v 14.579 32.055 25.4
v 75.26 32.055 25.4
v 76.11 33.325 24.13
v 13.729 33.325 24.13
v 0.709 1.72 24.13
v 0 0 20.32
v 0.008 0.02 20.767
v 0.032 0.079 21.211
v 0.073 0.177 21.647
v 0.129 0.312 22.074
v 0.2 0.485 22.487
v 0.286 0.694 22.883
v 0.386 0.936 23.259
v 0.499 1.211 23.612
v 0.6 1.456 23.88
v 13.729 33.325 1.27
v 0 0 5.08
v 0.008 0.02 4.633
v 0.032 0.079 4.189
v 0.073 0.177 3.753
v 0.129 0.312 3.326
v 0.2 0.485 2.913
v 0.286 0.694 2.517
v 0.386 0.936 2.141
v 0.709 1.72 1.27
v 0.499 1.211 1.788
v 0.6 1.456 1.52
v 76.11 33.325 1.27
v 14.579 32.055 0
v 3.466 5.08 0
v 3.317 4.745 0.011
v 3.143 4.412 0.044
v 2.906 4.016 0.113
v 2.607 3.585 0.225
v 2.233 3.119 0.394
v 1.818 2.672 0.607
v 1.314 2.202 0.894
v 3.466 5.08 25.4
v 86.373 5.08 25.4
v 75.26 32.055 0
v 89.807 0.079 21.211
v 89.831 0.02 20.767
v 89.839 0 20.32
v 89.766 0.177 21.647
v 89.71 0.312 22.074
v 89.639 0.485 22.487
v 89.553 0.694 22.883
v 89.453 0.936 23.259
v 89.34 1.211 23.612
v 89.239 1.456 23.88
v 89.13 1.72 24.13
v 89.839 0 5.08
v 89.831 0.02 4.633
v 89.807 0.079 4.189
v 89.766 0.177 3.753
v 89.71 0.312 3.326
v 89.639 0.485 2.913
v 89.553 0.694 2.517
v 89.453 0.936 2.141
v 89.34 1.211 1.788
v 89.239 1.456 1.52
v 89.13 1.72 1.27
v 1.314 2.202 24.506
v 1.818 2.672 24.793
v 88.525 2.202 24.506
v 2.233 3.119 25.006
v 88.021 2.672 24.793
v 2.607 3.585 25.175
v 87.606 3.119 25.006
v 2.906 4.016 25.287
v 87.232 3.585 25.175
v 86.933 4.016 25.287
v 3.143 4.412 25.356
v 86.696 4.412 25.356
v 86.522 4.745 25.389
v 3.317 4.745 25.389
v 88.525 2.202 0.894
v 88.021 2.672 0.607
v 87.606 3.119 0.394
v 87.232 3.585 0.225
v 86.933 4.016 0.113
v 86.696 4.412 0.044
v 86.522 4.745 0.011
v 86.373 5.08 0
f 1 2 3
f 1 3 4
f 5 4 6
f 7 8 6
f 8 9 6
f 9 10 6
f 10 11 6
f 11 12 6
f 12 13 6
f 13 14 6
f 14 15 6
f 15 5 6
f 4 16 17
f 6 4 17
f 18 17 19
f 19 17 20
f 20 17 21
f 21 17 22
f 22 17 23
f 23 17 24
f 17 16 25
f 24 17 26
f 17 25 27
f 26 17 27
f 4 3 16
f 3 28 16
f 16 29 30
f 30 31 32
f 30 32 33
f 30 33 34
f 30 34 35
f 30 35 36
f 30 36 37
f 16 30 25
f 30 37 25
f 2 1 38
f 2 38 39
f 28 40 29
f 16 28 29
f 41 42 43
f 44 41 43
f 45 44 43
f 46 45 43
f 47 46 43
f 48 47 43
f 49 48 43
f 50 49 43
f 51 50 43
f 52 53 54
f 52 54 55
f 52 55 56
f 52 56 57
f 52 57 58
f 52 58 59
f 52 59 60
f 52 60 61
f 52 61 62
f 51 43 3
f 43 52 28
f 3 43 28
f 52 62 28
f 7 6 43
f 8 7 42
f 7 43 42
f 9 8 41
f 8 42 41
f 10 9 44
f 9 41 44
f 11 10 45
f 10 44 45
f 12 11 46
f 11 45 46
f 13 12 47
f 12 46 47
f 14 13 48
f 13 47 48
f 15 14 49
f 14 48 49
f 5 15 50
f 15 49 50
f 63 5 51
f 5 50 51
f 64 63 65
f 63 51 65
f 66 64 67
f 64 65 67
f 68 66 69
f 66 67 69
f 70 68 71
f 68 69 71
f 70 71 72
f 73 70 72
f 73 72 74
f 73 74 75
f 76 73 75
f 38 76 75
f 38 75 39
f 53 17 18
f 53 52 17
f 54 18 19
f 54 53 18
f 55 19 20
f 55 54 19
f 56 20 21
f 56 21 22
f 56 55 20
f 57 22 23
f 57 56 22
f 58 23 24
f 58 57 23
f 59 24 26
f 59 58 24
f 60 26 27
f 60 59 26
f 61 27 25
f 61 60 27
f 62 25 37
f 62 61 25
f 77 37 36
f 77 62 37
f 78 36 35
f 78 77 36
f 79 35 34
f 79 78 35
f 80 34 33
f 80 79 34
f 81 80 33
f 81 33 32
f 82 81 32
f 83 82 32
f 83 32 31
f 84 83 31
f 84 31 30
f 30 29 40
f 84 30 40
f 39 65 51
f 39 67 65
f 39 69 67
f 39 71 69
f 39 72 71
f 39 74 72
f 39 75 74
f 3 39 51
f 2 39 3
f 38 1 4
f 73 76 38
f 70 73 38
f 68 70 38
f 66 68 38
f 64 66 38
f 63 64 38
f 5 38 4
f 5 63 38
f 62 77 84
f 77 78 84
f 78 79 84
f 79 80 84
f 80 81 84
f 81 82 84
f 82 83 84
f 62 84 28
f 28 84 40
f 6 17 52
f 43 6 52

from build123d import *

# Parameters (mm, degrees)
F1_DEPTH = 25.4
F2_SIZE  = 1.27
F3_R     = 5.08
F4_SIZE  = 1.27


with BuildPart() as f1:
    # F0 (on Top) → F1 (new body)
    with BuildSketch(Plane.XY):
        Polygon((13.728917, 33.325016), (0, 0), (89.838997, 0), (76.11008, 33.325016), align=None)
    extrude(amount=F1_DEPTH)

    # F2
    f2_edges = [f1.edges().sort_by_distance(p)[0] for p in [
        (6.864458, 16.662508, 25.4),
        (6.864458, 16.662508, 0),
        (82.974538, 16.662508, 25.4),
        (82.974538, 16.662508, 0),
    ]]
    chamfer(f2_edges, length=F2_SIZE)

    # F3
    f3_edges = [f1.edges().sort_by_distance(p)[0] for p in [
        (44.919498, 0, 0),
        (44.919498, 0, 25.4),
    ]]
    fillet(f3_edges, radius=F3_R)

    # F4
    f4_edges = [f1.edges().sort_by_distance(p)[0] for p in [
        (44.919498, 33.325016, 25.4),
        (44.919498, 33.325016, 0),
    ]]
    chamfer(f4_edges, length=F4_SIZE)


solid = f1.part
